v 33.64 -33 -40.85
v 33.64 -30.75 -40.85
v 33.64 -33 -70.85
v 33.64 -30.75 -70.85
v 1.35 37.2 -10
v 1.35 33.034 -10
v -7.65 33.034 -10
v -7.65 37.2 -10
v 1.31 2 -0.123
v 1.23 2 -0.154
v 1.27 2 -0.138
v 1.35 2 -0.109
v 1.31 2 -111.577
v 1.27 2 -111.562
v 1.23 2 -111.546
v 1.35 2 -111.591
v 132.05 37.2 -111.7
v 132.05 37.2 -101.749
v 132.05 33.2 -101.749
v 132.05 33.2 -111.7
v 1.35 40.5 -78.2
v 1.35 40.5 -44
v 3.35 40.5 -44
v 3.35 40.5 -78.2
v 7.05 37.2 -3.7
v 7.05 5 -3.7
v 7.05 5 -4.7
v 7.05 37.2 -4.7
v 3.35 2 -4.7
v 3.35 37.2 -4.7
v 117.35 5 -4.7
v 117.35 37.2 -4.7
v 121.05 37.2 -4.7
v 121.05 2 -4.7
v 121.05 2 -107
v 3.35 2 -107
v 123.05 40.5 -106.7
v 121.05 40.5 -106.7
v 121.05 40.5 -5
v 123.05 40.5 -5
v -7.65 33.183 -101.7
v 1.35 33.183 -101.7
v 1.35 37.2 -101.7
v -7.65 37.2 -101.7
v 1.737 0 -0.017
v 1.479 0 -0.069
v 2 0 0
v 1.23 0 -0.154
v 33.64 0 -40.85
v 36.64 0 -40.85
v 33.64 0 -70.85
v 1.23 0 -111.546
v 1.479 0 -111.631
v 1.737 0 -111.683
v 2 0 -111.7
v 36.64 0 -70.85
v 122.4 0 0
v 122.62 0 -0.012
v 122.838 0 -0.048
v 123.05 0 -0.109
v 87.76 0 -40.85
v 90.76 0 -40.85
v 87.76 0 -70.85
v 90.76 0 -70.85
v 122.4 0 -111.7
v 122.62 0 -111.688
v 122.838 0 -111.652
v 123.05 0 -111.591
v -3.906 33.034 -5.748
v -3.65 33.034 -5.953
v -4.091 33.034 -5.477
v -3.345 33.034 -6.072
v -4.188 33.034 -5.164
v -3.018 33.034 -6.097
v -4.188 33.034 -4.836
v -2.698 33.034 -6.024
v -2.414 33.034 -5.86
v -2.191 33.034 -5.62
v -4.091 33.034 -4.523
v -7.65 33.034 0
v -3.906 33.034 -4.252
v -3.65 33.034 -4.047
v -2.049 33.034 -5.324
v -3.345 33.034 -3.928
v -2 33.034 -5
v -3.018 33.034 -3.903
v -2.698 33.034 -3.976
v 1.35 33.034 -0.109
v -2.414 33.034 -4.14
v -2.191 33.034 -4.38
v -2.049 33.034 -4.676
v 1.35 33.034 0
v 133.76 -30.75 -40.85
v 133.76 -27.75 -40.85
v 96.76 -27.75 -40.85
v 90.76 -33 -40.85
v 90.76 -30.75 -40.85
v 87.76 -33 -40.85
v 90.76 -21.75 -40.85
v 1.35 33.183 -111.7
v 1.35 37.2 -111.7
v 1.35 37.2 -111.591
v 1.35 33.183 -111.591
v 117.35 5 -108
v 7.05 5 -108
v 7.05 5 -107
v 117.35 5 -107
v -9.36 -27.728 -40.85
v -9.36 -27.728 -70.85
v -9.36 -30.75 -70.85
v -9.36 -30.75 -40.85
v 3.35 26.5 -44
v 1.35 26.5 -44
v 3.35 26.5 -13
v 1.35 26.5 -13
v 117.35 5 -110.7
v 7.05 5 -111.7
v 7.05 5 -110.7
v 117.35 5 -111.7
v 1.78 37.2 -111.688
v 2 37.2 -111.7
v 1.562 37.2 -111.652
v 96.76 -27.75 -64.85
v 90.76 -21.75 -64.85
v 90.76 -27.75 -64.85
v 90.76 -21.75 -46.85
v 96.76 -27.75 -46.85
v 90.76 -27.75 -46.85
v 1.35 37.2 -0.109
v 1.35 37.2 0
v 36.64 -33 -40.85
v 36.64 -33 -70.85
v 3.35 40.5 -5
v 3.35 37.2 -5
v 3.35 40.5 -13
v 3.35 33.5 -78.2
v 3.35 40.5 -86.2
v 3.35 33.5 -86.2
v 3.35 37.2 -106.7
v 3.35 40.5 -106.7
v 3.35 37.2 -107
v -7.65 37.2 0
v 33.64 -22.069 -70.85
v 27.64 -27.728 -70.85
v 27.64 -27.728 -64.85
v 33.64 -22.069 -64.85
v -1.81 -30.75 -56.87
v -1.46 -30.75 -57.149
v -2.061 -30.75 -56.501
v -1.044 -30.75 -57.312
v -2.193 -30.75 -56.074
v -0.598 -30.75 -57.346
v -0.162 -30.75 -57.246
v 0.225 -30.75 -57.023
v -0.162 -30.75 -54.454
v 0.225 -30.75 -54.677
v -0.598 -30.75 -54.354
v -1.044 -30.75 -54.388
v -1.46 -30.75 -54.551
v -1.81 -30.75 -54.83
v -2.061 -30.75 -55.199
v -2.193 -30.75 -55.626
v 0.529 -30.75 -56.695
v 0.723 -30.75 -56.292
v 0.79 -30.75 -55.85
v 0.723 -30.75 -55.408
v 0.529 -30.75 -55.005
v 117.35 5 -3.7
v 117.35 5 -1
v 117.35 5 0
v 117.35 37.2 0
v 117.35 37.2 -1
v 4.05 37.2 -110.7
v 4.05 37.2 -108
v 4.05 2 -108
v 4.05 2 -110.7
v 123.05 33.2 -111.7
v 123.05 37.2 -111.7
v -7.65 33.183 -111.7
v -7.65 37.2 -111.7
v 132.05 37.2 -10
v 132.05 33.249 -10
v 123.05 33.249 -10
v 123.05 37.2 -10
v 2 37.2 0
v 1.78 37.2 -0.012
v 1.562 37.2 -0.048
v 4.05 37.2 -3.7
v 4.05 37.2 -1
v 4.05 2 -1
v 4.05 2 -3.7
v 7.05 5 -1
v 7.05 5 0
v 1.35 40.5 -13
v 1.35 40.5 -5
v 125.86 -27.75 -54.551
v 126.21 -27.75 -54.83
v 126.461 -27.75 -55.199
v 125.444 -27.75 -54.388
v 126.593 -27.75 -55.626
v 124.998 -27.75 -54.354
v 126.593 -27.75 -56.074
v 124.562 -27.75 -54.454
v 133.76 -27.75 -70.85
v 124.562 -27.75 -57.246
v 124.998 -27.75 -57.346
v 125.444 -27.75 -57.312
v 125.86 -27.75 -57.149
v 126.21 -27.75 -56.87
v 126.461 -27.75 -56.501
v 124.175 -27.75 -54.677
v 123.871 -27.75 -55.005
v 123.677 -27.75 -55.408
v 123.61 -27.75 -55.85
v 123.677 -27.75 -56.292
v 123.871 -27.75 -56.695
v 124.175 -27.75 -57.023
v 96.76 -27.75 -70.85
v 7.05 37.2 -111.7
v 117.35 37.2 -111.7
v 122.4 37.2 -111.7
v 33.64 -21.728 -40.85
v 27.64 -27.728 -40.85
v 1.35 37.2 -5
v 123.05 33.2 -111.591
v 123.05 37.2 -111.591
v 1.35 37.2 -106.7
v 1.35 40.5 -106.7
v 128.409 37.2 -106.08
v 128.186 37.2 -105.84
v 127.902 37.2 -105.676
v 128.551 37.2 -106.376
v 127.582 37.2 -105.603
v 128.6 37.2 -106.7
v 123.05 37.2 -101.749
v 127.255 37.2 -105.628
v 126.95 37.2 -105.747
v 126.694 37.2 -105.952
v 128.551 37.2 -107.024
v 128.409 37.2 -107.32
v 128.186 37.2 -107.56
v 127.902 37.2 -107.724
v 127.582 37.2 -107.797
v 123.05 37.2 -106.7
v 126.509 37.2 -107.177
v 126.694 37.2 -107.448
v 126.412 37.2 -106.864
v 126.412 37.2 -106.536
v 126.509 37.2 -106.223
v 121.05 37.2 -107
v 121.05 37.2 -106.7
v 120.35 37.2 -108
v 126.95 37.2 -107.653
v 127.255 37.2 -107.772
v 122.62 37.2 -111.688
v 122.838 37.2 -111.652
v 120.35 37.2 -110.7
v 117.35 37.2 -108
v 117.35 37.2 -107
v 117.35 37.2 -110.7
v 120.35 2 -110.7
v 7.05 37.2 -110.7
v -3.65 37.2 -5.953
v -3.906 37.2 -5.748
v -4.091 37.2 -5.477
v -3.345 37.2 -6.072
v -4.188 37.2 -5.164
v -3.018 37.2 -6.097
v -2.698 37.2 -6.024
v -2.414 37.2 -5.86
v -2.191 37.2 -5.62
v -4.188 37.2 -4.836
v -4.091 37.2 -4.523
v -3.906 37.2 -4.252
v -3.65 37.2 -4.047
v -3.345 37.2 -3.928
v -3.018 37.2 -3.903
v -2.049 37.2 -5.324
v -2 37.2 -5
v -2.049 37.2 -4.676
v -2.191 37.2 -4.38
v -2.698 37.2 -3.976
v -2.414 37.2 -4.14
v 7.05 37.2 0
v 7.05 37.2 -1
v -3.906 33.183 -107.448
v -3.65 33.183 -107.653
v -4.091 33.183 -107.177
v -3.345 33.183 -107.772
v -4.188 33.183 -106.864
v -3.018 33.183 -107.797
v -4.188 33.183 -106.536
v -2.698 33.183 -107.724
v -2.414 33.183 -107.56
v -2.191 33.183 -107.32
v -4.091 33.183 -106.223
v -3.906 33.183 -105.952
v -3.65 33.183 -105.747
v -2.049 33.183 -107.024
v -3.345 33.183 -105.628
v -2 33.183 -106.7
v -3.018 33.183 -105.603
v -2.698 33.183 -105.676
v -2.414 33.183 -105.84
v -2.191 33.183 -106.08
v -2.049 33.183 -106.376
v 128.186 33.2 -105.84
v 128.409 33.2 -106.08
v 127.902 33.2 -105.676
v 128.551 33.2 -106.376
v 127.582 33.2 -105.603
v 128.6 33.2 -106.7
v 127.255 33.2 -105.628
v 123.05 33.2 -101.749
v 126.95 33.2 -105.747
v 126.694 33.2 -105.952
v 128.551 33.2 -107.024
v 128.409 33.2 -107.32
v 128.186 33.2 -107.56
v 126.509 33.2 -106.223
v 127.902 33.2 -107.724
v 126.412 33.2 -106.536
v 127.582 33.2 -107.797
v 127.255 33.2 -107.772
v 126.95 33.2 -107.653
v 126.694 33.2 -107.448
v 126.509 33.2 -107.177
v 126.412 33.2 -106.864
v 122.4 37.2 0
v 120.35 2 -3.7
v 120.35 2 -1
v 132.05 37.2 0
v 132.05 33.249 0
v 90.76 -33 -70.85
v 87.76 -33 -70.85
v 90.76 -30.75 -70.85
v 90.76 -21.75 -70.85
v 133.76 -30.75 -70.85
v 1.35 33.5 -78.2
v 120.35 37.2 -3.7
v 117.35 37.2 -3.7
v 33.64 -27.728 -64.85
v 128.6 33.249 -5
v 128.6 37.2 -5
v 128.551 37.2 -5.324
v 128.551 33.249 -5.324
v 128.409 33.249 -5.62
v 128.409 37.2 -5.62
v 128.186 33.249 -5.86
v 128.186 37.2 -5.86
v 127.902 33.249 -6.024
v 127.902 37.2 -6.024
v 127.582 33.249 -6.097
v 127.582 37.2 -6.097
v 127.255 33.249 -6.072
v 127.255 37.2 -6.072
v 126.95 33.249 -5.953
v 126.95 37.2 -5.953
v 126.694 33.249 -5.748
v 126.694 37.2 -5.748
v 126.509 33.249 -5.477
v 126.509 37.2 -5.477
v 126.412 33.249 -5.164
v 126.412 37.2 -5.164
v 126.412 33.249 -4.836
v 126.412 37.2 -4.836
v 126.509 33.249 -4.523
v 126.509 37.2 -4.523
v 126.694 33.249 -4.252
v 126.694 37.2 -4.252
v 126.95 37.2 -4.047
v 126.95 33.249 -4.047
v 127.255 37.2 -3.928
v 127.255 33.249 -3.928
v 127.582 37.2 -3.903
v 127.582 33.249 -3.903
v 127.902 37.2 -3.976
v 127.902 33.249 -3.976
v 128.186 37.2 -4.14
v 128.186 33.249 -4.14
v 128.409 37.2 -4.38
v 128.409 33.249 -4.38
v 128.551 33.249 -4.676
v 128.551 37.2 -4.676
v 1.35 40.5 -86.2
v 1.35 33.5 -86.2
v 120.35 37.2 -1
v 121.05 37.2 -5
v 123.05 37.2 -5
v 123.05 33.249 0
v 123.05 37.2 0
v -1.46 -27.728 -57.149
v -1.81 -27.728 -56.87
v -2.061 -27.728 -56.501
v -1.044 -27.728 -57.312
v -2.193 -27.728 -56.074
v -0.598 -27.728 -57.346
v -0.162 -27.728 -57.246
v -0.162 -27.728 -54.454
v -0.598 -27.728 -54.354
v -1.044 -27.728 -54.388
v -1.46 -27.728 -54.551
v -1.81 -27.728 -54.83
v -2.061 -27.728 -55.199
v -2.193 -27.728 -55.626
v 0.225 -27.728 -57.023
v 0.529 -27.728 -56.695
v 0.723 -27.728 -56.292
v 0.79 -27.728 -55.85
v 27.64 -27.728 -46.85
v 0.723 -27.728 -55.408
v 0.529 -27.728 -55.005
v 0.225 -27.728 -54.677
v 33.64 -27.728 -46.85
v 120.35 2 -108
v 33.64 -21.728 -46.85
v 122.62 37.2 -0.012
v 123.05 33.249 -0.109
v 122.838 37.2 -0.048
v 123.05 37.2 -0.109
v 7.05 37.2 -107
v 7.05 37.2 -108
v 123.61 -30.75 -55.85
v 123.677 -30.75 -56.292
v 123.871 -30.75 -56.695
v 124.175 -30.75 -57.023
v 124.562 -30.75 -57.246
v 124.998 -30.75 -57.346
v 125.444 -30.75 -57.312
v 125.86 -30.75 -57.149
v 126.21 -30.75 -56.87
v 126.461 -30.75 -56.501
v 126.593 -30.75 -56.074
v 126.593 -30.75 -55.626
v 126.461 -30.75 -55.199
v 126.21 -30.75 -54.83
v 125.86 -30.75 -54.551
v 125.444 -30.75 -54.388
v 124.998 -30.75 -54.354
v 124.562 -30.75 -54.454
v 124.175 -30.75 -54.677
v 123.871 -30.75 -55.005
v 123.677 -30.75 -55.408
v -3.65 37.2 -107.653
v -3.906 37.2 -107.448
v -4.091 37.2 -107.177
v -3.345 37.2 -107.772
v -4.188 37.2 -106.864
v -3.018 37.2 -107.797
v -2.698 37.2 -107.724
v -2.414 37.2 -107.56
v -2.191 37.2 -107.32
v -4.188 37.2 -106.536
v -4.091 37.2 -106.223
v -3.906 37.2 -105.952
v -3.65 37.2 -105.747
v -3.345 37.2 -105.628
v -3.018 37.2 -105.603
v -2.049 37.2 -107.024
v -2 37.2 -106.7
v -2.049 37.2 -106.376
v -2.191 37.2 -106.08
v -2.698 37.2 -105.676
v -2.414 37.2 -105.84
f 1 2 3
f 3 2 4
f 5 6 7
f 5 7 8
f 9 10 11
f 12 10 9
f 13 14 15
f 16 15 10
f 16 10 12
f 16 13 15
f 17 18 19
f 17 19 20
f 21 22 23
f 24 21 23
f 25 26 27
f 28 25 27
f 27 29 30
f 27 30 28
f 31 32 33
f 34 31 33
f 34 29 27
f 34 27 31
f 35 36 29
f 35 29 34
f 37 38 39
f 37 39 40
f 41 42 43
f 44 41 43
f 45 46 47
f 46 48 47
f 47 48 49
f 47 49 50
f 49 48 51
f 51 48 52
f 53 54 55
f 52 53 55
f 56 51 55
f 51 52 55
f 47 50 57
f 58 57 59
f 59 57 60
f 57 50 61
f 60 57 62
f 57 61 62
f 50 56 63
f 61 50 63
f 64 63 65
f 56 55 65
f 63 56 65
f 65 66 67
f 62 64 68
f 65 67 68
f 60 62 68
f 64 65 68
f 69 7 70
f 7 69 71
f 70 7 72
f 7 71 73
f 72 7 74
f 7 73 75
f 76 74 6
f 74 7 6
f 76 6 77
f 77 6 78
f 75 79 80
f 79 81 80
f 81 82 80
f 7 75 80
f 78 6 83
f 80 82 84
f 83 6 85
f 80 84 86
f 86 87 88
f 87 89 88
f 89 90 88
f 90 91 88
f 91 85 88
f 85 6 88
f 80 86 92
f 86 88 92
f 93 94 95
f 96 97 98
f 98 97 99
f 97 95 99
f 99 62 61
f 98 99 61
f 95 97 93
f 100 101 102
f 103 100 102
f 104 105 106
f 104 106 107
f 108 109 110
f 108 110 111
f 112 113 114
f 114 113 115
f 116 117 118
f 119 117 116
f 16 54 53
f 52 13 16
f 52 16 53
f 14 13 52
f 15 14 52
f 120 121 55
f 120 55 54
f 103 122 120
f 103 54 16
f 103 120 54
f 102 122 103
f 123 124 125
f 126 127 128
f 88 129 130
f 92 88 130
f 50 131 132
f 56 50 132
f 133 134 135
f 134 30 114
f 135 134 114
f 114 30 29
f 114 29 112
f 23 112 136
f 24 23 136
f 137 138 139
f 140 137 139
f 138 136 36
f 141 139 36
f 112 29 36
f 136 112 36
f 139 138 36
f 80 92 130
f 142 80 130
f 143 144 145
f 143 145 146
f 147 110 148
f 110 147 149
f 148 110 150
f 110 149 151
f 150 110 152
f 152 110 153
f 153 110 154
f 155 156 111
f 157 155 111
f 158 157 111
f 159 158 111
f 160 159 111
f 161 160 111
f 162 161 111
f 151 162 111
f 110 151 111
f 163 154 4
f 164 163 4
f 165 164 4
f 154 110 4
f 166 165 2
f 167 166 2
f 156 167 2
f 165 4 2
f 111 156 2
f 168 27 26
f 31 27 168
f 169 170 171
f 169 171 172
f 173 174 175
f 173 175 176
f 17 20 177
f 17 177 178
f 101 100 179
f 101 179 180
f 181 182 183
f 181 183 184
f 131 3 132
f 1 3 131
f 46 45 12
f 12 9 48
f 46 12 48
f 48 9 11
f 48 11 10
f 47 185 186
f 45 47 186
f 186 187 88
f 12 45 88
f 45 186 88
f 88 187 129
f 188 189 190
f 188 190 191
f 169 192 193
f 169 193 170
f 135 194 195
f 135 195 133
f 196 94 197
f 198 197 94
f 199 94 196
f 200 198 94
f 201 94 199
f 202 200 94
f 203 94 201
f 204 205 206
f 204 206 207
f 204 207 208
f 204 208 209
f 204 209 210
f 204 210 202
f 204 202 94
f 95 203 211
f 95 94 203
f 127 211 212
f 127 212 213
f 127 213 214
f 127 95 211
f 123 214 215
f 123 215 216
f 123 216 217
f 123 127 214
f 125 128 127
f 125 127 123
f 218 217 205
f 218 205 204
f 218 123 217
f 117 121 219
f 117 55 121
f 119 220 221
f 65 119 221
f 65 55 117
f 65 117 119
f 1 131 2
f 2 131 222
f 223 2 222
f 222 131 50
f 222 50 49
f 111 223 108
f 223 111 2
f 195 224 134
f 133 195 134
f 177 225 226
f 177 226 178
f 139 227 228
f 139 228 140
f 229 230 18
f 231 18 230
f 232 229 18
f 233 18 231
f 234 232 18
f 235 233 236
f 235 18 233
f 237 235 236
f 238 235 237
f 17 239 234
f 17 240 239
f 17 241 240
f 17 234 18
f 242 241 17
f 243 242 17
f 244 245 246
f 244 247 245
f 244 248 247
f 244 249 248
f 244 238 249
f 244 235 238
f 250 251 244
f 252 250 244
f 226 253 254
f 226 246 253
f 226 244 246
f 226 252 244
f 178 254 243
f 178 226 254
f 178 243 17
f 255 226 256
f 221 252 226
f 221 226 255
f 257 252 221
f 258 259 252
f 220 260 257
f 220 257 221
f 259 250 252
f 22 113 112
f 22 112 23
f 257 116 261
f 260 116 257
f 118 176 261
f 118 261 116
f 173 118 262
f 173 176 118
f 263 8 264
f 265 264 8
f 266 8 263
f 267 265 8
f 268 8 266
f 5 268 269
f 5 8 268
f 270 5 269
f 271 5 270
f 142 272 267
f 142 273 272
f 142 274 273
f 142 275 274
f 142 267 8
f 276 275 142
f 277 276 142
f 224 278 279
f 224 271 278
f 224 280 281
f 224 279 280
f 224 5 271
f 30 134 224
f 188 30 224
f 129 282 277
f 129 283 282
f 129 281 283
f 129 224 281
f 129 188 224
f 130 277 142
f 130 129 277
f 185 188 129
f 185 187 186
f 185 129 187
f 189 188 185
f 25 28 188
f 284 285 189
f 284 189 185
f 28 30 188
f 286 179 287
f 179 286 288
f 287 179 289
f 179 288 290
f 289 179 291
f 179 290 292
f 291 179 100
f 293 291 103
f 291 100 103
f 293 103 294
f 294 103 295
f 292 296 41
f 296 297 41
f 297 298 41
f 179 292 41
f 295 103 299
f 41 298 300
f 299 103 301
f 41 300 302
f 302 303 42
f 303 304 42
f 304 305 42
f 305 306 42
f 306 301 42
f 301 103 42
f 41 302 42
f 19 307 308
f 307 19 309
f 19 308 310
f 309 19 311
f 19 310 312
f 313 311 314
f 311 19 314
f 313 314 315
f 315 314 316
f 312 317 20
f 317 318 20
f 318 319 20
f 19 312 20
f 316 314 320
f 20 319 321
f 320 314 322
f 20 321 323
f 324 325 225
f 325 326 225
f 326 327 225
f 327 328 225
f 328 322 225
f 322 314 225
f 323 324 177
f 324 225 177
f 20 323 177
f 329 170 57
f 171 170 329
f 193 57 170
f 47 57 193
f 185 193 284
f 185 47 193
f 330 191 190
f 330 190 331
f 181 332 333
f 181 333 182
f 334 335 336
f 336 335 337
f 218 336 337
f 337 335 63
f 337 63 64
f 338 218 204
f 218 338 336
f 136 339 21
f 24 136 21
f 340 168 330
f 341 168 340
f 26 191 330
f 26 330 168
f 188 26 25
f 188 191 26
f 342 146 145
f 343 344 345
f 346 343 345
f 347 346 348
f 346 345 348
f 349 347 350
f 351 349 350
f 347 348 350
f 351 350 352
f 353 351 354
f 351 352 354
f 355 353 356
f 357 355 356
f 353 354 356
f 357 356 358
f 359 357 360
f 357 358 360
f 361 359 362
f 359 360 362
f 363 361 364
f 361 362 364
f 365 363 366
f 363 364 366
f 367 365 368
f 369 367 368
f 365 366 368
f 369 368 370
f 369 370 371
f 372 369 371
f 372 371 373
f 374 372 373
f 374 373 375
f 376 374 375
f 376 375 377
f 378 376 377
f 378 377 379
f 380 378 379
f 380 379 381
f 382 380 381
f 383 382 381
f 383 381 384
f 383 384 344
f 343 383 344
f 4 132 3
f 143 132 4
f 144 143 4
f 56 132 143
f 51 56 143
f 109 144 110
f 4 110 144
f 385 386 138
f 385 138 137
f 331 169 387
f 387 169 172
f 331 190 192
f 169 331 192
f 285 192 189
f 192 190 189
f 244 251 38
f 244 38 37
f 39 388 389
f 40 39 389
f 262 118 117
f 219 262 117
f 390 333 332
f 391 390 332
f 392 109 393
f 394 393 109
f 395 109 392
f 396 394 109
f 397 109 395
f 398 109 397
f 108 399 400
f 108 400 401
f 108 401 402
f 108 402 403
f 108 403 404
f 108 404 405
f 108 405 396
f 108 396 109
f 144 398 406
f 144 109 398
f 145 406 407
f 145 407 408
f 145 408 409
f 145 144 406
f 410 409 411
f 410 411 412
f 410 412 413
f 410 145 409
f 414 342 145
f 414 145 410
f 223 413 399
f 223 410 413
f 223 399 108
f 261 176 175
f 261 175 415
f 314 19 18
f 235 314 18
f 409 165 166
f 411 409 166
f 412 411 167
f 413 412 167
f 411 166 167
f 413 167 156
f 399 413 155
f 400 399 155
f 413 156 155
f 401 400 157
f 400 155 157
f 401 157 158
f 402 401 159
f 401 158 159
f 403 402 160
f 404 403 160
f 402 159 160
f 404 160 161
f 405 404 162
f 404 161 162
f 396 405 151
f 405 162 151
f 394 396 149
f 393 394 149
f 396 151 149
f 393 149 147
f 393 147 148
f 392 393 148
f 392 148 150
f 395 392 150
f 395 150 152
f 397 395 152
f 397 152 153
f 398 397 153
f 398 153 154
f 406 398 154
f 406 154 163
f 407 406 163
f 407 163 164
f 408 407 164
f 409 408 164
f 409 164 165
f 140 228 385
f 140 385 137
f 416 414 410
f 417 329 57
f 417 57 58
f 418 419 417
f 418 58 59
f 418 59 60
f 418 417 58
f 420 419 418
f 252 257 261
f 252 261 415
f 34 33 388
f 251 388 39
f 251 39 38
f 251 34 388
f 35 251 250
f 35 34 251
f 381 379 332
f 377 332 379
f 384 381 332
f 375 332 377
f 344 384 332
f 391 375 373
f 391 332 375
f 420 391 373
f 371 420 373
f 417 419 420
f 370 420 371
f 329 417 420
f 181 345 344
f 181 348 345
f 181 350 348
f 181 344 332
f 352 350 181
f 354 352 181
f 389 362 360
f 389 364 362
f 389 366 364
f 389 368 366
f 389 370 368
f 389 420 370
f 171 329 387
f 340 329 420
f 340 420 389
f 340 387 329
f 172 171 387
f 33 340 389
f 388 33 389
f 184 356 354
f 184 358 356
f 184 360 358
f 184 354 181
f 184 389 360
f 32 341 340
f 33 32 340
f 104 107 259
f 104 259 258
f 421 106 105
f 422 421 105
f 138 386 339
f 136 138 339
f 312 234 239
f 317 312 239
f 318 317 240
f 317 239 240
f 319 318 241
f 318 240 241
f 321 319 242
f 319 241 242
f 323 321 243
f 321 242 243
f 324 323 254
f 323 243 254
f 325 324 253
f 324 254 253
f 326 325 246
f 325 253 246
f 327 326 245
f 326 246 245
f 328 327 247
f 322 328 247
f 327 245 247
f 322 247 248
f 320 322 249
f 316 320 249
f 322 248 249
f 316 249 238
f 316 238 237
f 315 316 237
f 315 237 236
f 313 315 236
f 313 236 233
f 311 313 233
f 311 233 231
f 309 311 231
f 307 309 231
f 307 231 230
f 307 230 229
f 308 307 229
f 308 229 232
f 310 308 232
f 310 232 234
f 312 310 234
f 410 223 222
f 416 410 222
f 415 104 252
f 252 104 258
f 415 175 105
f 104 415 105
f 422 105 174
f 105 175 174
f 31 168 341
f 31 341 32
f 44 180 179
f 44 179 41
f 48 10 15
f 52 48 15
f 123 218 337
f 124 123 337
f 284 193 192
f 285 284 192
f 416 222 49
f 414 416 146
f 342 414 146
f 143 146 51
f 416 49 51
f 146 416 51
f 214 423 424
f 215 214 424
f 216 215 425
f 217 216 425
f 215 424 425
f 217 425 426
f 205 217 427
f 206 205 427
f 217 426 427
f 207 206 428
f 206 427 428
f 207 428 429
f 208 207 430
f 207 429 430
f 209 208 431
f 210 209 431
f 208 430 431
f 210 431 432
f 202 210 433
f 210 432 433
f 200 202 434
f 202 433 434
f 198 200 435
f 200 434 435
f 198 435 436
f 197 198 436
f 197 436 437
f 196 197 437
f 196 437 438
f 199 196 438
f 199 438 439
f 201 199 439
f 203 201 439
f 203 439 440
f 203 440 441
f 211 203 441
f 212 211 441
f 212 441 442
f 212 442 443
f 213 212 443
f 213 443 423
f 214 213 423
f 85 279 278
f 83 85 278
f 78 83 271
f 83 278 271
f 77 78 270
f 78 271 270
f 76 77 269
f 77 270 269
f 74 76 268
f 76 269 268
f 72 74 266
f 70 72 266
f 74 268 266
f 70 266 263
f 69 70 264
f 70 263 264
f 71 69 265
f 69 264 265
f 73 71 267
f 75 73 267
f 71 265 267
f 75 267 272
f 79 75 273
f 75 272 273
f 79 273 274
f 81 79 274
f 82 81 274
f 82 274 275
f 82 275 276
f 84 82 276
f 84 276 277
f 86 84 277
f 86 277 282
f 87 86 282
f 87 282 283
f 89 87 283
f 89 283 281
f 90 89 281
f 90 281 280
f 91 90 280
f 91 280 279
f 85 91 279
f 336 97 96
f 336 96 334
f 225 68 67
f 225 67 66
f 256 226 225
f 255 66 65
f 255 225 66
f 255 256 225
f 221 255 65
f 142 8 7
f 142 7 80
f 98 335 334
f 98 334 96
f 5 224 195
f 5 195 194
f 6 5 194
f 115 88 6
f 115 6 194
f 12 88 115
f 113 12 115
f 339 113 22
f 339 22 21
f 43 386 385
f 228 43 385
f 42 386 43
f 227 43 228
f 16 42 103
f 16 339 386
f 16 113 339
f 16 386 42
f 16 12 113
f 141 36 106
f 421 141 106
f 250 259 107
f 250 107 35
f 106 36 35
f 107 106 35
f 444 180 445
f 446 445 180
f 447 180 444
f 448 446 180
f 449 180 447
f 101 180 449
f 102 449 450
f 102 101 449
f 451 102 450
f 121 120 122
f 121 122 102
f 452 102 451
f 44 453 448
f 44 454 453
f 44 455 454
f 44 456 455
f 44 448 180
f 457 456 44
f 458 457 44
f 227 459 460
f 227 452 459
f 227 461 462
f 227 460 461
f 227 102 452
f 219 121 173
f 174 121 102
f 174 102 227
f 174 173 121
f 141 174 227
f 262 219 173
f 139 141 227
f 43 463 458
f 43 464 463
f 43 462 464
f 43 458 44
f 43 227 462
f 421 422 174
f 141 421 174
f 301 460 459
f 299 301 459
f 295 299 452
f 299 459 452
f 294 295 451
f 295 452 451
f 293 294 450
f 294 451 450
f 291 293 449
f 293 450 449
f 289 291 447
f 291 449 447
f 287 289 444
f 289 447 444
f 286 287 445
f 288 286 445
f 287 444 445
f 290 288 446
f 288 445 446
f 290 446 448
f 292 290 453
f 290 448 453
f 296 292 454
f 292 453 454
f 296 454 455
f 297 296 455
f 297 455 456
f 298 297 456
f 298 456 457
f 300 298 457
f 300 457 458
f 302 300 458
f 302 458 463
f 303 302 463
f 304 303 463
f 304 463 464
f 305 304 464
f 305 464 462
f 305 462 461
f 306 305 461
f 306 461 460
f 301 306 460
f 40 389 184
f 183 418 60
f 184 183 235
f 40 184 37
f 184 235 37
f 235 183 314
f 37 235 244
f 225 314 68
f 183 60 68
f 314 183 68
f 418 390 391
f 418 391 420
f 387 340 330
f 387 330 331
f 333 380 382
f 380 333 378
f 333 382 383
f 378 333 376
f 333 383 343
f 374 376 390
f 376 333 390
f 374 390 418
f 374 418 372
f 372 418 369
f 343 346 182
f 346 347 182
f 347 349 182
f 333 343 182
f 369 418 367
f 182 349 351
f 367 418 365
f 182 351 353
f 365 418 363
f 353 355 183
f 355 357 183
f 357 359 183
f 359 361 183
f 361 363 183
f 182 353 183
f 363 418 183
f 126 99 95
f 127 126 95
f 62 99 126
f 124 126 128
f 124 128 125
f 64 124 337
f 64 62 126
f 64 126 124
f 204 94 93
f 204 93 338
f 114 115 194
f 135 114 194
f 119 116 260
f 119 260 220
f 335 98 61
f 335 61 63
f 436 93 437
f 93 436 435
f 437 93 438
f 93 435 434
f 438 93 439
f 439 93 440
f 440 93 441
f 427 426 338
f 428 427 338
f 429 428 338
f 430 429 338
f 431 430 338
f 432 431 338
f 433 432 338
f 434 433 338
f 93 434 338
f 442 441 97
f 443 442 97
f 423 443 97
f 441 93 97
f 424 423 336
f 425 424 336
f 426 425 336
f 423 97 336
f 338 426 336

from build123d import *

# Parameters (mm, degrees)
SKETCH1_W            = 124.4
SKETCH1_H            = 111.7
BOSS_EXTRUDE1_DEPTH  = 2
SKETCH2_W            = 2
SKETCH2_H            = 101.7
BOSS_EXTRUDE2_DEPTH  = 38.5
SKETCH3_W            = 121.7
SKETCH3_H            = 4.7
BOSS_EXTRUDE3_DEPTH  = 3
SKETCH5_W            = 116.3
SKETCH5_H            = 2.7
CUT_EXTRUDE8_DEPTH   = 3
SKETCH14_W           = 121.7
SKETCH14_H           = 4.7
BOSS_EXTRUDE6_DEPTH  = 3
SKETCH15_W           = 116.3
SKETCH15_H           = 2.7
CUT_EXTRUDE14_DEPTH  = 3
SKETCH18_W           = 2
SKETCH18_H           = 0.3
BOSS_EXTRUDE7_DEPTH  = 35.2
SKETCH19_W           = 5.7
SKETCH19_H           = 4.7
BOSS_EXTRUDE8_DEPTH  = 32.2
SKETCH20_W           = 2.7
SKETCH20_H           = 32.2
CUT_EXTRUDE15_DEPTH  = 3
SKETCH21_W           = 2.7
SKETCH21_H           = 32.2
CUT_EXTRUDE16_DEPTH  = 3
SKETCH24_W           = 2.7
SKETCH24_H           = 32.2
CUT_EXTRUDE18_DEPTH  = 3
SKETCH25_W           = 2.7
SKETCH25_H           = 32.2
CUT_EXTRUDE19_DEPTH  = 3
SKETCH30_W           = 31
SKETCH30_H           = 14
SKETCH30_W_2         = 8
SKETCH30_H_2         = 7
CUT_EXTRUDE23_DEPTH  = 2
SKETCH31_W           = 6
SKETCH31_H           = 36.2
BOSS_EXTRUDE9_DEPTH  = 1.35
FILLET1_R            = 2
SKETCH33_W           = 99.7
SKETCH33_H           = 3
BOSS_EXTRUDE11_DEPTH = 1.35
SKETCH43_W           = 1.229805297
SKETCH43_H           = 112.077966817
CUT_EXTRUDE25_DEPTH  = 38.2
SKETCH47_W           = 57.12
SKETCH47_H           = 30
BOSS_EXTRUDE22_DEPTH = 38
SKETCH49_W           = 51.12
SKETCH49_H           = 30
CUT_EXTRUDE30_DEPTH  = 38
SKETCH51_W           = 2.352063359
SKETCH51_H           = 112.382279656
CUT_EXTRUDE33_DEPTH  = 77.2
SKETCH54_W           = 10
SKETCH54_H           = 4.16571725
SKETCH54_H_2         = 4.016594053
BOSS_EXTRUDE23_DEPTH = 9
SKETCH55_W           = 10
SKETCH55_H           = 3.950767522
SKETCH55_W_2         = 9.95127899
SKETCH55_H_2         = 4
BOSS_EXTRUDE24_DEPTH = 9
SKETCH56_R           = 1.1
CUT_EXTRUDE34_DEPTH  = 10
SKETCH57_R           = 1
CUT_EXTRUDE35_DEPTH  = 99.41
SKETCH58_W           = 30
SKETCH58_H           = 3
BOSS_EXTRUDE25_DEPTH = 43
SKETCH59_W           = 30
SKETCH59_H           = 3.021561104
BOSS_EXTRUDE26_DEPTH = 43
BOSS_EXTRUDE28_DEPTH = 6
BOSS_EXTRUDE29_DEPTH = 6
BOSS_EXTRUDE30_DEPTH = 6
BOSS_EXTRUDE31_DEPTH = 6
SKETCH64_W           = 30
SKETCH64_H           = 6.546083461
CUT_EXTRUDE36_DEPTH  = 101.12
SKETCH65_R           = 1.5
CUT_EXTRUDE37_DEPTH  = 6
SKETCH67_R           = 1.5
CUT_EXTRUDE39_DEPTH  = 6


with BuildPart() as part:
    # Sketch1 → Boss-Extrude1 (new body)
    with BuildSketch(Plane(origin=(0, 0, 0), x_dir=(1, 0, 0), z_dir=(0, 1, 0))):
        with Locations((62.2, 55.85)):
            Rectangle(SKETCH1_W, SKETCH1_H)
    extrude(amount=BOSS_EXTRUDE1_DEPTH)

    # Sketch2 → Boss-Extrude2 (add)
    with BuildSketch(Plane(origin=(0, 2, 0), x_dir=(1, 0, 0), z_dir=(0, 1, 0))):
        with Locations((122.05, 55.85)):
            Rectangle(SKETCH2_W, SKETCH2_H)
        with Locations((2.35, 55.85)):
            Rectangle(SKETCH2_W, SKETCH2_H)
    extrude(amount=BOSS_EXTRUDE2_DEPTH)

    # Sketch3 → Boss-Extrude3 (add)
    with BuildSketch(Plane(origin=(0, 2, 0), x_dir=(1, 0, 0), z_dir=(0, 1, 0))):
        with Locations((62.2, 2.35)):
            Rectangle(SKETCH3_W, SKETCH3_H)
    extrude(amount=BOSS_EXTRUDE3_DEPTH)

    # Sketch5 → Cut-Extrude8 (cut)
    with BuildSketch(Plane(origin=(0, 5, 0), x_dir=(1, 0, 0), z_dir=(0, 1, 0))):
        with Locations((62.2, 2.35)):
            Rectangle(SKETCH5_W, SKETCH5_H)
    extrude(amount=-CUT_EXTRUDE8_DEPTH, mode=Mode.SUBTRACT)

    # Sketch14 → Boss-Extrude6 (add)
    with BuildSketch(Plane(origin=(0, 2, 0), x_dir=(1, 0, 0), z_dir=(0, 1, 0))):
        with Locations((62.2, 109.35)):
            Rectangle(SKETCH14_W, SKETCH14_H)
    extrude(amount=BOSS_EXTRUDE6_DEPTH)

    # Sketch15 → Cut-Extrude14 (cut)
    with BuildSketch(Plane(origin=(0, 5, 0), x_dir=(1, 0, 0), z_dir=(0, 1, 0))):
        with Locations((62.2, 109.35)):
            Rectangle(SKETCH15_W, SKETCH15_H)
    extrude(amount=-CUT_EXTRUDE14_DEPTH, mode=Mode.SUBTRACT)

    # Sketch18 → Boss-Extrude7 (add)
    with BuildSketch(Plane(origin=(0, 2, 0), x_dir=(1, 0, 0), z_dir=(0, 1, 0))):
        with Locations((2.35, 106.85)):
            Rectangle(SKETCH18_W, SKETCH18_H)
        with Locations((122.05, 106.85)):
            Rectangle(SKETCH18_W, SKETCH18_H)
        with Locations((122.05, 4.85)):
            Rectangle(SKETCH18_W, SKETCH18_H)
        with Locations((2.35, 4.85)):
            Rectangle(SKETCH18_W, SKETCH18_H)
    extrude(amount=BOSS_EXTRUDE7_DEPTH)

    # Sketch19 → Boss-Extrude8 (add)
    with BuildSketch(Plane(origin=(0, 5, 0), x_dir=(1, 0, 0), z_dir=(0, 1, 0))):
        with Locations((120.2, 2.35)):
            Rectangle(SKETCH19_W, SKETCH19_H)
        with Locations((4.2, 2.35)):
            Rectangle(SKETCH19_W, SKETCH19_H)
        with Locations((120.2, 109.35)):
            Rectangle(SKETCH19_W, SKETCH19_H)
        with Locations((4.2, 109.35)):
            Rectangle(SKETCH19_W, SKETCH19_H)
    extrude(amount=BOSS_EXTRUDE8_DEPTH)

    # Sketch20 → Cut-Extrude15 (cut)
    with BuildSketch(Plane.ZY.offset(-117.35)):
        with Locations((-109.35, 21.1)):
            Rectangle(SKETCH20_W, SKETCH20_H)
    extrude(amount=-CUT_EXTRUDE15_DEPTH, mode=Mode.SUBTRACT)

    # Sketch21 → Cut-Extrude16 (cut)
    with BuildSketch(Plane(origin=(7.05, 0, 0), x_dir=(0, 0, -1), z_dir=(1, 0, 0))):
        with Locations((109.35, 21.1)):
            Rectangle(SKETCH21_W, SKETCH21_H)
    extrude(amount=-CUT_EXTRUDE16_DEPTH, mode=Mode.SUBTRACT)

    # Sketch24 → Cut-Extrude18 (cut)
    with BuildSketch(Plane(origin=(7.05, 0, 0), x_dir=(0, 0, -1), z_dir=(1, 0, 0))):
        with Locations((2.35, 21.1)):
            Rectangle(SKETCH24_W, SKETCH24_H)
    extrude(amount=-CUT_EXTRUDE18_DEPTH, mode=Mode.SUBTRACT)

    # Sketch25 → Cut-Extrude19 (cut)
    with BuildSketch(Plane.ZY.offset(-117.35)):
        with Locations((-2.35, 21.1)):
            Rectangle(SKETCH25_W, SKETCH25_H)
    extrude(amount=-CUT_EXTRUDE19_DEPTH, mode=Mode.SUBTRACT)

    # Sketch30 → Cut-Extrude23 (cut)
    with BuildSketch(Plane.ZY.offset(-1.35)):
        with Locations((-28.5, 33.5)):
            Rectangle(SKETCH30_W, SKETCH30_H)
        with Locations((-82.2, 37)):
            Rectangle(SKETCH30_W_2, SKETCH30_H_2)
    extrude(amount=-CUT_EXTRUDE23_DEPTH, mode=Mode.SUBTRACT)

    # Sketch31 → Boss-Extrude9 (add)
    with BuildSketch(Plane(origin=(123.05, 0, 0), x_dir=(0, 0, -1), z_dir=(1, 0, 0))):
        with Locations((3, 20.1)):
            Rectangle(SKETCH31_W, SKETCH31_H)
        with Locations((108.7, 20.1)):
            Rectangle(SKETCH31_W, SKETCH31_H)
    extrude(amount=BOSS_EXTRUDE9_DEPTH)

    # Fillet1
    fillet1_edges = [part.edges().sort_by_distance(p)[0] for p in [
        (0, 1, 0),
        (124.4, 19.1, 0),
        (124.4, 19.1, -111.7),
        (0, 1, -111.7),
    ]]
    fillet(fillet1_edges, radius=FILLET1_R)

    # Sketch33 → Boss-Extrude11 (add)
    with BuildSketch(Plane(origin=(123.05, 0, 0), x_dir=(0, 0, -1), z_dir=(1, 0, 0))):
        with Locations((55.85, 3.5)):
            Rectangle(SKETCH33_W, SKETCH33_H)
    extrude(amount=BOSS_EXTRUDE11_DEPTH)

    # Sketch43 → Cut-Extrude25 (cut, through all)
    with BuildSketch(Plane(origin=(0, 37.2, 0), x_dir=(1, 0, 0), z_dir=(0, 1, 0))):
        with Locations((0.614902649, 56.193231497)):
            Rectangle(SKETCH43_W, SKETCH43_H)
    extrude(amount=-CUT_EXTRUDE25_DEPTH, mode=Mode.SUBTRACT)

    # Sketch47 → Boss-Extrude22 (add)
    with BuildSketch(Plane(origin=(0, 0, 0), x_dir=(-1, 0, 0), z_dir=(0, -1, 0))):
        with Locations((-62.2, 55.85)):
            Rectangle(SKETCH47_W, SKETCH47_H)
    extrude(amount=BOSS_EXTRUDE22_DEPTH)

    # Sketch49 → Cut-Extrude30 (cut)
    with BuildSketch(Plane(origin=(0, -38, 0), x_dir=(-1, 0, 0), z_dir=(0, -1, 0))):
        with Locations((-62.2, 55.85)):
            Rectangle(SKETCH49_W, SKETCH49_H)
    extrude(amount=-CUT_EXTRUDE30_DEPTH, mode=Mode.SUBTRACT)

    # Sketch51 → Cut-Extrude33 (cut, through all)
    with BuildSketch(Plane(origin=(0, 38.2, 0), x_dir=(1, 0, 0), z_dir=(0, 1, 0))):
        with Locations((124.22603168, 56.299711796)):
            Rectangle(SKETCH51_W, SKETCH51_H)
    extrude(amount=-CUT_EXTRUDE33_DEPTH, mode=Mode.SUBTRACT)

    # Sketch54 → Boss-Extrude23 (add)
    with BuildSketch(Plane.ZY.offset(-1.35)):
        with Locations((-5, 35.117141375)):
            Rectangle(SKETCH54_W, SKETCH54_H)
        with Locations((-106.7, 35.191702973)):
            Rectangle(SKETCH54_W, SKETCH54_H_2)
    extrude(amount=BOSS_EXTRUDE23_DEPTH)

    # Sketch55 → Boss-Extrude24 (add)
    with BuildSketch(Plane(origin=(123.05, 0, 0), x_dir=(0, 0, -1), z_dir=(1, 0, 0))):
        with Locations((5, 35.224616239)):
            Rectangle(SKETCH55_W, SKETCH55_H)
        with Locations((106.724360505, 35.2)):
            Rectangle(SKETCH55_W_2, SKETCH55_H_2)
    extrude(amount=BOSS_EXTRUDE24_DEPTH)

    # Sketch56 → Cut-Extrude34 (cut)
    with BuildSketch(Plane(origin=(0, 37.2, 0), x_dir=(1, 0, 0), z_dir=(0, 1, 0))):
        with Locations((-3.1, 106.7)):
            Circle(SKETCH56_R)
        with Locations((127.5, 106.7)):
            Circle(SKETCH56_R)
        with Locations((127.5, 5)):
            Circle(SKETCH56_R)
        with Locations((-3.1, 5)):
            Circle(SKETCH56_R)
    extrude(amount=-CUT_EXTRUDE34_DEPTH, mode=Mode.SUBTRACT)

    # Sketch57 → Cut-Extrude35 (cut, through all)
    with BuildSketch(Plane(origin=(90.76, 0, 0), x_dir=(0, 0, -1), z_dir=(1, 0, 0))):
        with Locations((45.85, -34)):
            Circle(SKETCH57_R)
        with Locations((65.85, -34)):
            Circle(SKETCH57_R)
    extrude(amount=-CUT_EXTRUDE35_DEPTH, mode=Mode.SUBTRACT)

    # Sketch58 → Boss-Extrude25 (add)
    with BuildSketch(Plane(origin=(90.76, 0, 0), x_dir=(0, 0, -1), z_dir=(1, 0, 0))):
        with Locations((55.85, -29.25)):
            Rectangle(SKETCH58_W, SKETCH58_H)
    extrude(amount=BOSS_EXTRUDE25_DEPTH)

    # Sketch59 → Boss-Extrude26 (add)
    with BuildSketch(Plane.ZY.offset(-33.64)):
        with Locations((-55.85, -29.239219448)):
            Rectangle(SKETCH59_W, SKETCH59_H)
    extrude(amount=BOSS_EXTRUDE26_DEPTH)

    # Sketch61 → Boss-Extrude28 (add)
    with BuildSketch(Plane.XY.offset(-40.85)):
        Polygon((90.76, -21.75), (96.76, -27.75), (90.76, -27.75), align=None)
    extrude(amount=-BOSS_EXTRUDE28_DEPTH)

    # Sketch62 → Boss-Extrude29 (add)
    with BuildSketch(Plane(origin=(0, 0, -70.85), x_dir=(-1, 0, 0), z_dir=(0, 0, -1))):
        Polygon((-90.76, -21.75), (-90.76, -27.75), (-96.76, -27.75), align=None)
    extrude(amount=-BOSS_EXTRUDE29_DEPTH)

    # Sketch60 → Boss-Extrude30 (add)
    with BuildSketch(Plane.XY.offset(-40.85)):
        Polygon((27.64, -27.728438896), (33.64, -21.728438896), (33.64, -27.728438896), align=None)
    extrude(amount=-BOSS_EXTRUDE30_DEPTH)

    # Sketch63 → Boss-Extrude31 (add)
    with BuildSketch(Plane(origin=(0, 0, -70.85), x_dir=(-1, 0, 0), z_dir=(0, 0, -1))):
        Polygon((-33.64, -22.069435851), (-33.64, -27.728438896), (-27.64, -27.728438896), align=None)
    extrude(amount=-BOSS_EXTRUDE31_DEPTH)

    # Sketch64 → Cut-Extrude36 (cut, through all)
    with BuildSketch(Plane.ZY.offset(-33.64)):
        with Locations((-55.85, -36.27304173)):
            Rectangle(SKETCH64_W, SKETCH64_H)
    extrude(amount=-CUT_EXTRUDE36_DEPTH, mode=Mode.SUBTRACT)

    # Sketch65 → Cut-Extrude37 (cut)
    with BuildSketch(Plane(origin=(0, -30.75, 0), x_dir=(-1, 0, 0), z_dir=(0, -1, 0))):
        with Locations((-125.11, 55.85)):
            Circle(SKETCH65_R)
    extrude(amount=-CUT_EXTRUDE37_DEPTH, mode=Mode.SUBTRACT)

    # Sketch67 → Cut-Extrude39 (cut)
    with BuildSketch(Plane.XZ.offset(30.75)):
        with Locations((-0.71, -55.85)):
            Circle(SKETCH67_R)
    extrude(amount=-CUT_EXTRUDE39_DEPTH, mode=Mode.SUBTRACT)


solid = part.part
